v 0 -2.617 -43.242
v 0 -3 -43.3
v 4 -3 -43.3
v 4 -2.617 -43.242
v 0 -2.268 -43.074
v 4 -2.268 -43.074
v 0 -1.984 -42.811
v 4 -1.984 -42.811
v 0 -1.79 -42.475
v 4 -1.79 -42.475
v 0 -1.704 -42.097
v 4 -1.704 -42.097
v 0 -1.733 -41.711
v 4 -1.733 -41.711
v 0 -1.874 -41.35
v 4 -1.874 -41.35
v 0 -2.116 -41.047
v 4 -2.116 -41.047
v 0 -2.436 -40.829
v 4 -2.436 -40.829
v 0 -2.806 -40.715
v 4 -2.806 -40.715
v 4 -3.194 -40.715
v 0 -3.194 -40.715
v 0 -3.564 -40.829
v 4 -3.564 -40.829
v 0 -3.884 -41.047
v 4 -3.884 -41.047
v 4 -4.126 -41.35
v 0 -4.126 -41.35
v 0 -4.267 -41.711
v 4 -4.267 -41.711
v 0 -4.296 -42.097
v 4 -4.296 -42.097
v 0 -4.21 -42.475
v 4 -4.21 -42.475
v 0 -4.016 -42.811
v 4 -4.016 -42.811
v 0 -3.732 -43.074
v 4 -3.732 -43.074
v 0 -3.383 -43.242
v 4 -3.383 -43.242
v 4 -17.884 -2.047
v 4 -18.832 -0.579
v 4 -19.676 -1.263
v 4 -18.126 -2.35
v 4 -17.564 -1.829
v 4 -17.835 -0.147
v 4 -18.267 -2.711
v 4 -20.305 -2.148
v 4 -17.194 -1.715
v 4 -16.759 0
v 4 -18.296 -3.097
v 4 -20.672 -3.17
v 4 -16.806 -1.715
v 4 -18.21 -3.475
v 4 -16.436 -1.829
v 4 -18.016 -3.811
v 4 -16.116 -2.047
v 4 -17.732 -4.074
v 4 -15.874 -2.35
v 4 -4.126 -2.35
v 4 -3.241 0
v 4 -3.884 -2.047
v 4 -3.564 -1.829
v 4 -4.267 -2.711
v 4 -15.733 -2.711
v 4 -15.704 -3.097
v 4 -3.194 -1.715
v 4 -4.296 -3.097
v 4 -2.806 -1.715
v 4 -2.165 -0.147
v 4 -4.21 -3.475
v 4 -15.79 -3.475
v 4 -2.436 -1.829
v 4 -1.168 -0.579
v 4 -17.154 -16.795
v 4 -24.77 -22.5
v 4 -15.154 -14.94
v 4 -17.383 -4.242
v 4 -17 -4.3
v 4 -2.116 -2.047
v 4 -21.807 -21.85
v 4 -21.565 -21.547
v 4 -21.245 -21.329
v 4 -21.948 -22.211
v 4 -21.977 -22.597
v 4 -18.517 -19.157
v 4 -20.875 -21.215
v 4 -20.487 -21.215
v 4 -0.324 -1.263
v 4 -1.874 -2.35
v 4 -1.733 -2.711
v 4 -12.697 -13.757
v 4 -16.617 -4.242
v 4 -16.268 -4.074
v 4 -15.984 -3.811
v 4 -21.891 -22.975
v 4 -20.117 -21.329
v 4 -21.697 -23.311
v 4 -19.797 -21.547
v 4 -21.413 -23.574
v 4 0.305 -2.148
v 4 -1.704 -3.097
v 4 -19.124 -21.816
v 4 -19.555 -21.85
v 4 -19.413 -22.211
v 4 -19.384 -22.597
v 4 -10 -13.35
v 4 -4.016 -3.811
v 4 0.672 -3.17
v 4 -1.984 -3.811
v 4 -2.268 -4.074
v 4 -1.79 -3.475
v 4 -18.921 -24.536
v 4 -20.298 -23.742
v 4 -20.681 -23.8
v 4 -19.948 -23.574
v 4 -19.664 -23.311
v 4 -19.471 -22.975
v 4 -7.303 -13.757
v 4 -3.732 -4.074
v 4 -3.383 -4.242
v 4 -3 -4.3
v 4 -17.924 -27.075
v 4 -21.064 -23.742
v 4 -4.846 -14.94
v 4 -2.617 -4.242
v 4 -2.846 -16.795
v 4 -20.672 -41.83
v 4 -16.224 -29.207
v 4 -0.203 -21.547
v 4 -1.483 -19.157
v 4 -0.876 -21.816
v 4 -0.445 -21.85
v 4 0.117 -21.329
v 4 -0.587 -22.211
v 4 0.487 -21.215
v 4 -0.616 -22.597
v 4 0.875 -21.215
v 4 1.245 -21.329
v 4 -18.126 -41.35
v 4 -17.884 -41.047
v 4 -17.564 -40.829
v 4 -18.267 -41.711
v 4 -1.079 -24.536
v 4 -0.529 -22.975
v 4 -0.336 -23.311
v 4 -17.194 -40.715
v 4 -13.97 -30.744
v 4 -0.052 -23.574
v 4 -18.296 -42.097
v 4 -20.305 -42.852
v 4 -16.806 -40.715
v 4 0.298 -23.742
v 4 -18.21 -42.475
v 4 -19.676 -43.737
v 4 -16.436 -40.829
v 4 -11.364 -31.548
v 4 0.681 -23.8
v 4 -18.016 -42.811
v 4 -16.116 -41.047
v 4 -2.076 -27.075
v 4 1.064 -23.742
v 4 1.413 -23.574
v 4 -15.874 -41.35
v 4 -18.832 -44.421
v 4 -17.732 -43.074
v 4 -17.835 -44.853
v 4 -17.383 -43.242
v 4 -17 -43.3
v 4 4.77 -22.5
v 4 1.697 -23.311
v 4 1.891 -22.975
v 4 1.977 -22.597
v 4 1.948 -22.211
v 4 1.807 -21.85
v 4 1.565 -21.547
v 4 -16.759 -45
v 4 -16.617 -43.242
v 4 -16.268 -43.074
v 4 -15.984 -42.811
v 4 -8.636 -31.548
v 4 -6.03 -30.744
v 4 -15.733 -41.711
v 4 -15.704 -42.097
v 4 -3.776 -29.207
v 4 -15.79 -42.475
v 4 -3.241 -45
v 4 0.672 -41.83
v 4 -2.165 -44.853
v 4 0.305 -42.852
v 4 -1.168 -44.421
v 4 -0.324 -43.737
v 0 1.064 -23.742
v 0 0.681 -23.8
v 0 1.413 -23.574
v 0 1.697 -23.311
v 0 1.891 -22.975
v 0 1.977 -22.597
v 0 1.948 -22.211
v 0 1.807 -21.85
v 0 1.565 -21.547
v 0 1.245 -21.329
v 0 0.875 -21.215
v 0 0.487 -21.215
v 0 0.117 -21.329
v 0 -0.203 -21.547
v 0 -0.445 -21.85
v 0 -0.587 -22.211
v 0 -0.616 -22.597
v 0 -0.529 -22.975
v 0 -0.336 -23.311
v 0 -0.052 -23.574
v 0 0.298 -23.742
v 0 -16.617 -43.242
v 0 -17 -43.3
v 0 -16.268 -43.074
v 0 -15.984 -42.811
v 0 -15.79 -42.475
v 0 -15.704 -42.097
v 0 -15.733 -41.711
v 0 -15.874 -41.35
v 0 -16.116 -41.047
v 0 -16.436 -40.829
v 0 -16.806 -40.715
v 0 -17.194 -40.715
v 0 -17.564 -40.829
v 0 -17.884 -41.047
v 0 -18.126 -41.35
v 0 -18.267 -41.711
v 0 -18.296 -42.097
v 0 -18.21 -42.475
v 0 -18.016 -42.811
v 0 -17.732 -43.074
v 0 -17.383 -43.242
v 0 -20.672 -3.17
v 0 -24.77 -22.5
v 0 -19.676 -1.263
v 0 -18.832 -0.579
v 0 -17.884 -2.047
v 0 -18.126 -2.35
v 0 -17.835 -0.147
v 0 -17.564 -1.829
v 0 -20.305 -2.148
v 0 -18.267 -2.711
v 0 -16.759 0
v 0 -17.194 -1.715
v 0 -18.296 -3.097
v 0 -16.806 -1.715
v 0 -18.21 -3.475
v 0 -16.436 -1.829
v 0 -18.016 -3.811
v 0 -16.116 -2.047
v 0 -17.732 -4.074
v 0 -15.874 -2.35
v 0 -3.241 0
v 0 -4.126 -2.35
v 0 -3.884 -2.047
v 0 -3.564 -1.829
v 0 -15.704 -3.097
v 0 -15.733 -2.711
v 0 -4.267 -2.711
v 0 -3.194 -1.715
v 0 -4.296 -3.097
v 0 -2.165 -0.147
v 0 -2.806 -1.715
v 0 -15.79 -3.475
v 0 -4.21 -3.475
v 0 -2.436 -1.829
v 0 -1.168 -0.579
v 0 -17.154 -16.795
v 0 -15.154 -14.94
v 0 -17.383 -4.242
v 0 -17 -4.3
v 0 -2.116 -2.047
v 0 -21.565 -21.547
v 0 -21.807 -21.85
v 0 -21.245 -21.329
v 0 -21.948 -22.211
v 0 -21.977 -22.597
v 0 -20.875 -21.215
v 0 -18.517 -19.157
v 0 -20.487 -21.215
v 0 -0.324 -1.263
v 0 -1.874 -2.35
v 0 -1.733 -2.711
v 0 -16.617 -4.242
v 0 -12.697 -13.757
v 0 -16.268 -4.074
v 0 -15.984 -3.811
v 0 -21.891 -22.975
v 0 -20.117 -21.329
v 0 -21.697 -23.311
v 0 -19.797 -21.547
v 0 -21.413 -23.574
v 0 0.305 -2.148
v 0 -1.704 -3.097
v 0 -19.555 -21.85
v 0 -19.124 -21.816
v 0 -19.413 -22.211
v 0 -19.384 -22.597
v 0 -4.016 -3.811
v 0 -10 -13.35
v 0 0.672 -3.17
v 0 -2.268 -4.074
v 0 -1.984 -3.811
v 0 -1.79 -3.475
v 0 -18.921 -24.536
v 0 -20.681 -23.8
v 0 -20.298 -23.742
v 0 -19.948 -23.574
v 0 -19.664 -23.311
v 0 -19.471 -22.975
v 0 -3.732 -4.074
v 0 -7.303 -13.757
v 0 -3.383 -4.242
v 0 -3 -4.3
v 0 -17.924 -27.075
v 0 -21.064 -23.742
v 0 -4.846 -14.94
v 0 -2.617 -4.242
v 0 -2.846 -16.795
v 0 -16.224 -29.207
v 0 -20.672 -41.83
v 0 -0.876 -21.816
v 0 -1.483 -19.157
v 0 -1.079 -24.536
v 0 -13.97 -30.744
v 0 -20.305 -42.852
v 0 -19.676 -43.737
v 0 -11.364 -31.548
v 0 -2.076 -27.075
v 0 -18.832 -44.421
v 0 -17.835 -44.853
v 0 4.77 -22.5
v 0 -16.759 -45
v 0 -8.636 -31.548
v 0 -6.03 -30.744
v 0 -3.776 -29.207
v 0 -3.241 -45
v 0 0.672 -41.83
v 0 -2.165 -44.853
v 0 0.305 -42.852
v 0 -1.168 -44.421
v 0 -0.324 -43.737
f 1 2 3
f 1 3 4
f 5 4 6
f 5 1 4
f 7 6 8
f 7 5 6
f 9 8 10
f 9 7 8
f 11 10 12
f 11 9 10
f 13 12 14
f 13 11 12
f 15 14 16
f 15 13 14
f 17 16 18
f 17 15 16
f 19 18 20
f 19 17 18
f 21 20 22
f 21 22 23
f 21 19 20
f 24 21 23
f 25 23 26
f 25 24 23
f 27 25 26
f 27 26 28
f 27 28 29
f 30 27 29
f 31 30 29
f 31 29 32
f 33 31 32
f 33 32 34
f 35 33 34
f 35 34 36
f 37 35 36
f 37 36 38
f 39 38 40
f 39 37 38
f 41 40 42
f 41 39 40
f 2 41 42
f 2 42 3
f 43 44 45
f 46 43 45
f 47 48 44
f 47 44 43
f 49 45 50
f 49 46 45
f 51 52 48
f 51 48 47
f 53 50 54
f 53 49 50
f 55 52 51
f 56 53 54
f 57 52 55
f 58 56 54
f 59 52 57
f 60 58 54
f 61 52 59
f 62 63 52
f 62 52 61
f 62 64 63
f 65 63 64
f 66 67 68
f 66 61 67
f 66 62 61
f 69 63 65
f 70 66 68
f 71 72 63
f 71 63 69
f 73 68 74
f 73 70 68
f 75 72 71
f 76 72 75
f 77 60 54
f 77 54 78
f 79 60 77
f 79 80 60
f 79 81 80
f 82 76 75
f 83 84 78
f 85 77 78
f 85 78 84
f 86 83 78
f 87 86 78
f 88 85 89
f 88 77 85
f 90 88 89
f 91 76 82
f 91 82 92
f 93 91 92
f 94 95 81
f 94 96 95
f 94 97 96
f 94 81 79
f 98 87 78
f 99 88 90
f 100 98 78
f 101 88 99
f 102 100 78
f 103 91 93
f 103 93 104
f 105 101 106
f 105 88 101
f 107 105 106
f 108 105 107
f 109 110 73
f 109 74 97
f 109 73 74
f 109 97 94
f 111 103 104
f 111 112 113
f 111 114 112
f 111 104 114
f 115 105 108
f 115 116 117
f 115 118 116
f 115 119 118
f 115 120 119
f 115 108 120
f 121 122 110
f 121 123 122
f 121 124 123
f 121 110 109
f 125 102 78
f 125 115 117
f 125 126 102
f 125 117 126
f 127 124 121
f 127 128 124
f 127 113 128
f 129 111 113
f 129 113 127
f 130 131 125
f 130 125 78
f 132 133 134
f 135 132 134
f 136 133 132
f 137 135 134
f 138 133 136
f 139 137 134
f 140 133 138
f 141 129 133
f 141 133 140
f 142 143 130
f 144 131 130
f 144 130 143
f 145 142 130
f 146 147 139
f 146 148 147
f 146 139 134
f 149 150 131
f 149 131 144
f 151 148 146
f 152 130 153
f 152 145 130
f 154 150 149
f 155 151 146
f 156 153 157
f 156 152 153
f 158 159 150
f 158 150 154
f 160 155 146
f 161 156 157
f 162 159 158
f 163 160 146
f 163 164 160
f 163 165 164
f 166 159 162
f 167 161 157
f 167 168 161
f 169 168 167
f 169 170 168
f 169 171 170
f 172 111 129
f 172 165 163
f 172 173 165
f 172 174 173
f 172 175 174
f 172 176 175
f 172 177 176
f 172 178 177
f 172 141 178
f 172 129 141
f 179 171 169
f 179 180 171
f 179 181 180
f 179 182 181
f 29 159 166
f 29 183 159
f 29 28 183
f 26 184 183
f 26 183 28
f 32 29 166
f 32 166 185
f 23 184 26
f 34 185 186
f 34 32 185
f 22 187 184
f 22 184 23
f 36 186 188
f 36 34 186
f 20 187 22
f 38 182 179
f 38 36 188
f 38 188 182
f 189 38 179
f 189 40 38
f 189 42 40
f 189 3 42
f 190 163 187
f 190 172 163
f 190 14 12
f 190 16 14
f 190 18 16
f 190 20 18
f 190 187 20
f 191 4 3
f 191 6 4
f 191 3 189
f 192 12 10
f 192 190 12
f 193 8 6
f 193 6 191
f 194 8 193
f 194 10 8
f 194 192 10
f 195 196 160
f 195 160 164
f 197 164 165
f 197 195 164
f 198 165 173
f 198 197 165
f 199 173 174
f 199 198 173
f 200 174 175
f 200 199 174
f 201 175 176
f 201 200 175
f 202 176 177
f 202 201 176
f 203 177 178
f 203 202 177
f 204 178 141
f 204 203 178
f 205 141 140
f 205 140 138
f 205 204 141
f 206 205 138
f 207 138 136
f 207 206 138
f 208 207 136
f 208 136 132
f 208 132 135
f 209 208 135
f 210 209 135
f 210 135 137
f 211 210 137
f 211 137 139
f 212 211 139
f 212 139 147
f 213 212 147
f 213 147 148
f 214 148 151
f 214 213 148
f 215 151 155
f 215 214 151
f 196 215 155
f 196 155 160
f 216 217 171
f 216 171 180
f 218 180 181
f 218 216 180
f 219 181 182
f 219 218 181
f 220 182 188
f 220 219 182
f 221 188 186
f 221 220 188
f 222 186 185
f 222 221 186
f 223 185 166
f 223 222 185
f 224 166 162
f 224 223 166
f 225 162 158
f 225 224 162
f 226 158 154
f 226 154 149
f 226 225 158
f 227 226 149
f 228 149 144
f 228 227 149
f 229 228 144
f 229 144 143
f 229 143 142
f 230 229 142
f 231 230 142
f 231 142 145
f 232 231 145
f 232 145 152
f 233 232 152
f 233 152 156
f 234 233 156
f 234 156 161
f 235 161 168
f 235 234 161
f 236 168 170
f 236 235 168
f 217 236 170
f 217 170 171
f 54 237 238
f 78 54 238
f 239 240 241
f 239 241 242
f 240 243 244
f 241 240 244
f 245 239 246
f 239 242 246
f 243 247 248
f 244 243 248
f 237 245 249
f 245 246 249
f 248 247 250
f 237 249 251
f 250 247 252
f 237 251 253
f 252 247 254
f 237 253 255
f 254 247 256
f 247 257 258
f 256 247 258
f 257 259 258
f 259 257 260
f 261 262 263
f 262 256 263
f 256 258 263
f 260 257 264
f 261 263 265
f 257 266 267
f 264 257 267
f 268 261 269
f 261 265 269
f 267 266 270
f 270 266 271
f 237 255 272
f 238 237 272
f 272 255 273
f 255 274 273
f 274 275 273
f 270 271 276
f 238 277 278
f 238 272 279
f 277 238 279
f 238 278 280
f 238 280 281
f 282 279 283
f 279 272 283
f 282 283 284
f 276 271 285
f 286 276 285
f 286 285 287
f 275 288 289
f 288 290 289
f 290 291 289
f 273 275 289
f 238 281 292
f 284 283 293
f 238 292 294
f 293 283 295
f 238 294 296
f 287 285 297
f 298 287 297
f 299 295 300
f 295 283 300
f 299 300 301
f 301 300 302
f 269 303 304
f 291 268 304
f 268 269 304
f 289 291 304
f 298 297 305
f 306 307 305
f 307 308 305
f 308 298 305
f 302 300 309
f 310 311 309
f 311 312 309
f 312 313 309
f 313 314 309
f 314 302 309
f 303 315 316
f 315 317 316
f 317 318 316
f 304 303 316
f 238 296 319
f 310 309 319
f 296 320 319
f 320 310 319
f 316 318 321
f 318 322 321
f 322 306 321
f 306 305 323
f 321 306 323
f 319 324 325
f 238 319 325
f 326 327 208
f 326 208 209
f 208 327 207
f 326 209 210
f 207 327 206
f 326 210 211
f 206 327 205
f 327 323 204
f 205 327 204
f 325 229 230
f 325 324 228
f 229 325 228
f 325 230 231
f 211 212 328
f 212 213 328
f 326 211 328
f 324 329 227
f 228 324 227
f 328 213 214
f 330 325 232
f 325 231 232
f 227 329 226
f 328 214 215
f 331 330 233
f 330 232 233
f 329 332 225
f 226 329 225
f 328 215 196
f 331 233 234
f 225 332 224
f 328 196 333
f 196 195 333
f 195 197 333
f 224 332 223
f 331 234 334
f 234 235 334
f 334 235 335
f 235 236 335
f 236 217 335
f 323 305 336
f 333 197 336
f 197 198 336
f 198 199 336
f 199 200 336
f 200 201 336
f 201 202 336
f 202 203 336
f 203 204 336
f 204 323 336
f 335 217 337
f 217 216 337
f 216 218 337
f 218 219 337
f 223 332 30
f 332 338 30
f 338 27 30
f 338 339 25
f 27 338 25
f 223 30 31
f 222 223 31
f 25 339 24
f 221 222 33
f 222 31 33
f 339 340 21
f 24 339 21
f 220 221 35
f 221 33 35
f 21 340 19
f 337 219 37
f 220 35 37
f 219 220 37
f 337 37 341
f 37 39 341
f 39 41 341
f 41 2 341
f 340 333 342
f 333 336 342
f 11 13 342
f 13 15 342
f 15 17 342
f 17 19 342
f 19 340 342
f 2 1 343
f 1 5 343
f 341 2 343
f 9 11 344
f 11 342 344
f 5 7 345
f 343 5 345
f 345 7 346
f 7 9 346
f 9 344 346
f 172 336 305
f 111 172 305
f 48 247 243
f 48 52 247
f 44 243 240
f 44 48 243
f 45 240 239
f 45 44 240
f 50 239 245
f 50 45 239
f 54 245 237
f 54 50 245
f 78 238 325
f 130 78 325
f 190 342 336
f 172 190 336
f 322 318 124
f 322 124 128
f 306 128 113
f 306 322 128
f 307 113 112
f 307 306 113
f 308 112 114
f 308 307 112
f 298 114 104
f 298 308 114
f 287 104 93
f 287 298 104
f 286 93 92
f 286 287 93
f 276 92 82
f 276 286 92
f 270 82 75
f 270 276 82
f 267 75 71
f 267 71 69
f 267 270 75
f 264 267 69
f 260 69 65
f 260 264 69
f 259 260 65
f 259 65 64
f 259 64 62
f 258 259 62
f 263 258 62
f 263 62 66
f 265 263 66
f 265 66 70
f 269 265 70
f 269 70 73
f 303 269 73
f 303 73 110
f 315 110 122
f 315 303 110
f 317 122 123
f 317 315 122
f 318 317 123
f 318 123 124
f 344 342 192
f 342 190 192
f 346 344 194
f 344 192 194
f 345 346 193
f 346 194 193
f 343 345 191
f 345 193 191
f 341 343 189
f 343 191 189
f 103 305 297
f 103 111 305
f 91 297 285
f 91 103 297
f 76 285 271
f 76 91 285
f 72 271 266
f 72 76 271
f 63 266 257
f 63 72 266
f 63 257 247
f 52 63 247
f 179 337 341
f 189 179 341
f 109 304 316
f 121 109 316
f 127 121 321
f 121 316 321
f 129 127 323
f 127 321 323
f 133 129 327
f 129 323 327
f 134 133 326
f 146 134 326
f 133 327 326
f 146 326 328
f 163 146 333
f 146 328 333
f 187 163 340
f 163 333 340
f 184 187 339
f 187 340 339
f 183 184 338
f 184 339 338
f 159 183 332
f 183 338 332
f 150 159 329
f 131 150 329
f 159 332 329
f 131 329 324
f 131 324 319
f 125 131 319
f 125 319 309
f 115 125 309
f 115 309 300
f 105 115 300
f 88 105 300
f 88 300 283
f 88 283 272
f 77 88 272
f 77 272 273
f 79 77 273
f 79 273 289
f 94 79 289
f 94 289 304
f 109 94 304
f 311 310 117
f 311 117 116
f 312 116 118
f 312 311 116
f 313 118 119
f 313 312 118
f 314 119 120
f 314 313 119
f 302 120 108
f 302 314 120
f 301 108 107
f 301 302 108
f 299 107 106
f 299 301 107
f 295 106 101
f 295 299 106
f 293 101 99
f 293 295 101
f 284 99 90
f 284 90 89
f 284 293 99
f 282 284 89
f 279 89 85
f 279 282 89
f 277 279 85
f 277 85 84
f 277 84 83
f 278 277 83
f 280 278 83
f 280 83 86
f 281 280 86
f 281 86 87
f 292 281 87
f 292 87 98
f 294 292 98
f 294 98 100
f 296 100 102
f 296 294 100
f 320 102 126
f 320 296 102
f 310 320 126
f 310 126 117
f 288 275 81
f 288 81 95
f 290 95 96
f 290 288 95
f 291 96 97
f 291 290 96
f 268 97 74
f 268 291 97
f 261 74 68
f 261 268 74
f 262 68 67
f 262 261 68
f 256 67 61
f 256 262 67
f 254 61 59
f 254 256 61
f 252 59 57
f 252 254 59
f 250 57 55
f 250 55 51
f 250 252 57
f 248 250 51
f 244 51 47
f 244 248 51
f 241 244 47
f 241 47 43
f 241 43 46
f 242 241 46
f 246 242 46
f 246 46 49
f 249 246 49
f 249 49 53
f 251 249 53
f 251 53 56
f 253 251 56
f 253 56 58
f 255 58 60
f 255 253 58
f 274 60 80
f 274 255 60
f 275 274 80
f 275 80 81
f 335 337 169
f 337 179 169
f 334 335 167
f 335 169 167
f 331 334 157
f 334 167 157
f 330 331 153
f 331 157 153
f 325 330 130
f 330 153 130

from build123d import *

# Parameters (mm, degrees)
SKETCH1_R           = 1.3
BOSS_EXTRUDE1_DEPTH = 4
SKETCH2_R           = 9.15
CUT_EXTRUDE1_DEPTH  = 52.522207254
FILLET1_R           = 4


with BuildPart() as part:
    # Sketch1 → Boss-Extrude1 (new body)
    with BuildSketch(Plane(origin=(0, 0, 0), x_dir=(0, 0, -1), z_dir=(1, 0, 0))):
        Polygon((45, 0), (22.5, 4.769696007), (0, 0), (0, -20), (22.5, -24.769696007), (45, -20), align=None)
        with Locations((22.5, 0.680807118)):
            Circle(SKETCH1_R, mode=Mode.SUBTRACT)
        with Locations((22.5, -20.680807118)):
            Circle(SKETCH1_R, mode=Mode.SUBTRACT)
        with Locations((42, -3)):
            Circle(SKETCH1_R, mode=Mode.SUBTRACT)
        with Locations((3, -3)):
            Circle(SKETCH1_R, mode=Mode.SUBTRACT)
        with Locations((3, -17)):
            Circle(SKETCH1_R, mode=Mode.SUBTRACT)
        with Locations((42, -17)):
            Circle(SKETCH1_R, mode=Mode.SUBTRACT)
    extrude(amount=BOSS_EXTRUDE1_DEPTH)

    # Sketch2 → Cut-Extrude1 (cut, through all)
    with BuildSketch(Plane.ZY):
        with Locations((-22.5, -10)):
            Circle(SKETCH2_R)
    extrude(amount=-CUT_EXTRUDE1_DEPTH, mode=Mode.SUBTRACT)

    # Fillet1
    fillet1_edges = [part.edges().sort_by_distance(p)[0] for p in [
        (2, -20, 0),
        (2, 0, 0),
        (2, 0, -45),
        (2, -20, -45),
    ]]
    fillet(fillet1_edges, radius=FILLET1_R)


solid = part.part
